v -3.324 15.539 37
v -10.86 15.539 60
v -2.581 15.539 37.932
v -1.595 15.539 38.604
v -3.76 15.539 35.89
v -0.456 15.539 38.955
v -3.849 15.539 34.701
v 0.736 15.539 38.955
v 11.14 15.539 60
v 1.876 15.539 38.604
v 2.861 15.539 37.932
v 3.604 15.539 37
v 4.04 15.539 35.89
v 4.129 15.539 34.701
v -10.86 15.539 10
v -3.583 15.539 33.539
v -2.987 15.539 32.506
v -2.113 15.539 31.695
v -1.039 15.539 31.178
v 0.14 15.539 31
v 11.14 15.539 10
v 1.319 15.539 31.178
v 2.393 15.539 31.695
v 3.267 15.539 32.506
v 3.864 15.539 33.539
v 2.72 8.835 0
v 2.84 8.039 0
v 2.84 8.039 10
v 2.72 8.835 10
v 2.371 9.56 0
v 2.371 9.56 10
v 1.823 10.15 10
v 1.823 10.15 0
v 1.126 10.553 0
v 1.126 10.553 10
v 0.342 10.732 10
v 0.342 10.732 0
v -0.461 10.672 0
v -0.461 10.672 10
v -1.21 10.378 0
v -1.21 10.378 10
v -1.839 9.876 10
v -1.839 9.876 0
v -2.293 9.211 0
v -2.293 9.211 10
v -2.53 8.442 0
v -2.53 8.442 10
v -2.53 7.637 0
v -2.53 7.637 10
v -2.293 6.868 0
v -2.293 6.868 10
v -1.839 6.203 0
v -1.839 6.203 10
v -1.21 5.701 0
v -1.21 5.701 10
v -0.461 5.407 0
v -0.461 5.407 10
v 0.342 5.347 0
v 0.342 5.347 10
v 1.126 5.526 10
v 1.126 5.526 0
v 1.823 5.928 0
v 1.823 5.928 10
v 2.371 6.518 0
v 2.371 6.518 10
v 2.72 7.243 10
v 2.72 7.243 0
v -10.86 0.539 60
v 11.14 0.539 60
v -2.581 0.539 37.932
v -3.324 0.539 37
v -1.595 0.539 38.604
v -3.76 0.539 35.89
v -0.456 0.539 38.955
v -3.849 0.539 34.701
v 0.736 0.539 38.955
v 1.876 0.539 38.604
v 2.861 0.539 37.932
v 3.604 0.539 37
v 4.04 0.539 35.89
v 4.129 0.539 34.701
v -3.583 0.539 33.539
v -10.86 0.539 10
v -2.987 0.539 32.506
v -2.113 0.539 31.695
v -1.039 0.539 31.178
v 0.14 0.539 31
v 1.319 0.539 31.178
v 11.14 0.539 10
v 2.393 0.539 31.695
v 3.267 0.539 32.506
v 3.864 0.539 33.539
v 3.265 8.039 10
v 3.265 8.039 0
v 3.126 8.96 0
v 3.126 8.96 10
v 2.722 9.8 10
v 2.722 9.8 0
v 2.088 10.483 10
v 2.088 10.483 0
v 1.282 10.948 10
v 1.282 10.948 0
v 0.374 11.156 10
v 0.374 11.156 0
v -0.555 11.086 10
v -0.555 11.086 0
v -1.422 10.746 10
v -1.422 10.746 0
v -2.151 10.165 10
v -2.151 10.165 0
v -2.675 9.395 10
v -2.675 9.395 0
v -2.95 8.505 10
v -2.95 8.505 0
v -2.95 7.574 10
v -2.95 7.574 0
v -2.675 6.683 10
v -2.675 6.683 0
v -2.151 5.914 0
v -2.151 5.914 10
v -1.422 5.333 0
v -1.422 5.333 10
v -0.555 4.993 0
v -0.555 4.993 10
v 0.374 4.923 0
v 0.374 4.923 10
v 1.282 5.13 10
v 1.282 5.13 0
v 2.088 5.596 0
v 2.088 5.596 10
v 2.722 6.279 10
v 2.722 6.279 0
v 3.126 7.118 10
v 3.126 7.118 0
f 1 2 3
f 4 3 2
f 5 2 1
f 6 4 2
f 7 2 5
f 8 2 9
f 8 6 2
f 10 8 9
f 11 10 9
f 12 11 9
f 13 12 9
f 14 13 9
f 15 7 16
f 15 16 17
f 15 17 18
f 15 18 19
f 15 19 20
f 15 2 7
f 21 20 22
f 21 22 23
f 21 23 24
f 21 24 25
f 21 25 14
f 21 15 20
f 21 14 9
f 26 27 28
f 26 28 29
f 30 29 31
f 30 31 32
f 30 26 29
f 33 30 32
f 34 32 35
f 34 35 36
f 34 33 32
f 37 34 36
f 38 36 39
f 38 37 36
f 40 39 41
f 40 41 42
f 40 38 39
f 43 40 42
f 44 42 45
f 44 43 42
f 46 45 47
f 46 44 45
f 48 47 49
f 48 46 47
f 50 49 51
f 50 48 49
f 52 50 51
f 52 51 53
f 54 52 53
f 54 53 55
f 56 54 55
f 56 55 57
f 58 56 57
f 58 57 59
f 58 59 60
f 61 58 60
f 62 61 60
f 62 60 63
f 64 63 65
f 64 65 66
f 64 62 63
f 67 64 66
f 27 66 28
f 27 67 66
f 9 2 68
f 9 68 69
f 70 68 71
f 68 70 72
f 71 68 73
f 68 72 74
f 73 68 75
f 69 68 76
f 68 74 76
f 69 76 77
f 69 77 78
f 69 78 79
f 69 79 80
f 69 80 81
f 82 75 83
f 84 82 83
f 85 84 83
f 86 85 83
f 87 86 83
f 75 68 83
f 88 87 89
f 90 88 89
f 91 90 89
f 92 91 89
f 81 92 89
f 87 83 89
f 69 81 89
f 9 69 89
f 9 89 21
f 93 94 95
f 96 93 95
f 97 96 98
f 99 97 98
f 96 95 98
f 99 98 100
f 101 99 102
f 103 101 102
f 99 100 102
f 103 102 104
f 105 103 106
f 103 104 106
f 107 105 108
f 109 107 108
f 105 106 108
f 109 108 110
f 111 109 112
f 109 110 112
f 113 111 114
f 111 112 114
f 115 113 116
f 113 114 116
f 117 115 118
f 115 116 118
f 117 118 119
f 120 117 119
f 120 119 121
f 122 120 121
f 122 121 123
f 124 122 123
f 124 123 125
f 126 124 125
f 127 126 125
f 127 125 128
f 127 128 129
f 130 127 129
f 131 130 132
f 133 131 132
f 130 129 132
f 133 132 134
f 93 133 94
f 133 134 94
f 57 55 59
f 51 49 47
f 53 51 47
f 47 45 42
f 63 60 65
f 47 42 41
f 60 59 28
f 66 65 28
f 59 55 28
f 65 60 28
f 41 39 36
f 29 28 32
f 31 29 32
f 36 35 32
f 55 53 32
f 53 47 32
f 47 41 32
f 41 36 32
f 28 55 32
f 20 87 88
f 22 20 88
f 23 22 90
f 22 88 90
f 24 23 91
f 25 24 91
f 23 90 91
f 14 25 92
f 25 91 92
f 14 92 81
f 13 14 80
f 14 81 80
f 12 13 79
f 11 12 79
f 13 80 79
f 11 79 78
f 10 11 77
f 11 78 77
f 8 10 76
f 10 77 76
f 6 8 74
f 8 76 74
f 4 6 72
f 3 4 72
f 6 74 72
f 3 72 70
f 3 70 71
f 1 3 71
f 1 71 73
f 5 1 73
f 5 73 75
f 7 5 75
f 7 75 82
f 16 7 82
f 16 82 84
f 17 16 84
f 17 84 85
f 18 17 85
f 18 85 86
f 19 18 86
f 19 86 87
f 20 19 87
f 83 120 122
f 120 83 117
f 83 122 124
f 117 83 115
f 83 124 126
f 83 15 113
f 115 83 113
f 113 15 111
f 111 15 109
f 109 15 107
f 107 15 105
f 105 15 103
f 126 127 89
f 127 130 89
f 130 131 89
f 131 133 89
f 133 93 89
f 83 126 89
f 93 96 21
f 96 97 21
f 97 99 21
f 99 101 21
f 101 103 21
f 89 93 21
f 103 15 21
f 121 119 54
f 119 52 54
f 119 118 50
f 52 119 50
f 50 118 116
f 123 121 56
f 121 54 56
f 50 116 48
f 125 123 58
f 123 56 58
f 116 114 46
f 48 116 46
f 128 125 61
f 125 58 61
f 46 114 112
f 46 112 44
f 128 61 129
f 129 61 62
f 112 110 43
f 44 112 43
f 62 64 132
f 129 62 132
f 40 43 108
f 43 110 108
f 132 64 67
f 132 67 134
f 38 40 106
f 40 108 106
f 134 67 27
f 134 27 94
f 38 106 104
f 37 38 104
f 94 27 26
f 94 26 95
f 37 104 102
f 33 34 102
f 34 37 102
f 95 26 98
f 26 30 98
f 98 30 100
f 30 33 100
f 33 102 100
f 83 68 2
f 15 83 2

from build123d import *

# Parameters (mm, degrees)
CROQUIS1_R              = 3.125
CROQUIS1_R_2            = 2.7
SALIENTE_EXTRUIR1_DEPTH = 10
CROQUIS2_W              = 22
CROQUIS2_H              = 15
SALIENTE_EXTRUIR2_DEPTH = 50
CROQUIS3_R              = 4
CORTAR_EXTRUIR1_DEPTH   = 63.841873384


with BuildPart() as part:
    # Croquis1 → Saliente-Extruir1 (new body)
    with BuildSketch(Plane.XY):
        with Locations((0.140065102, 8.039289834)):
            Circle(CROQUIS1_R)
        with Locations((0.140065102, 8.039289834)):
            Circle(CROQUIS1_R_2, mode=Mode.SUBTRACT)
    extrude(amount=SALIENTE_EXTRUIR1_DEPTH)

    # Croquis2 → Saliente-Extruir2 (add)
    with BuildSketch(Plane.XY.offset(10)):
        with Locations((0.140065102, 8.039289834)):
            Rectangle(CROQUIS2_W, CROQUIS2_H)
    extrude(amount=SALIENTE_EXTRUIR2_DEPTH)

    # Croquis3 → Cortar-Extruir1 (cut, through all)
    with BuildSketch(Plane.XZ.offset(-0.539289834)):
        with Locations(Location((0.140065102, 35, 0), (0, 0, 270))):
            Circle(CROQUIS3_R)
    extrude(amount=-CORTAR_EXTRUIR1_DEPTH, mode=Mode.SUBTRACT)


solid = part.part
